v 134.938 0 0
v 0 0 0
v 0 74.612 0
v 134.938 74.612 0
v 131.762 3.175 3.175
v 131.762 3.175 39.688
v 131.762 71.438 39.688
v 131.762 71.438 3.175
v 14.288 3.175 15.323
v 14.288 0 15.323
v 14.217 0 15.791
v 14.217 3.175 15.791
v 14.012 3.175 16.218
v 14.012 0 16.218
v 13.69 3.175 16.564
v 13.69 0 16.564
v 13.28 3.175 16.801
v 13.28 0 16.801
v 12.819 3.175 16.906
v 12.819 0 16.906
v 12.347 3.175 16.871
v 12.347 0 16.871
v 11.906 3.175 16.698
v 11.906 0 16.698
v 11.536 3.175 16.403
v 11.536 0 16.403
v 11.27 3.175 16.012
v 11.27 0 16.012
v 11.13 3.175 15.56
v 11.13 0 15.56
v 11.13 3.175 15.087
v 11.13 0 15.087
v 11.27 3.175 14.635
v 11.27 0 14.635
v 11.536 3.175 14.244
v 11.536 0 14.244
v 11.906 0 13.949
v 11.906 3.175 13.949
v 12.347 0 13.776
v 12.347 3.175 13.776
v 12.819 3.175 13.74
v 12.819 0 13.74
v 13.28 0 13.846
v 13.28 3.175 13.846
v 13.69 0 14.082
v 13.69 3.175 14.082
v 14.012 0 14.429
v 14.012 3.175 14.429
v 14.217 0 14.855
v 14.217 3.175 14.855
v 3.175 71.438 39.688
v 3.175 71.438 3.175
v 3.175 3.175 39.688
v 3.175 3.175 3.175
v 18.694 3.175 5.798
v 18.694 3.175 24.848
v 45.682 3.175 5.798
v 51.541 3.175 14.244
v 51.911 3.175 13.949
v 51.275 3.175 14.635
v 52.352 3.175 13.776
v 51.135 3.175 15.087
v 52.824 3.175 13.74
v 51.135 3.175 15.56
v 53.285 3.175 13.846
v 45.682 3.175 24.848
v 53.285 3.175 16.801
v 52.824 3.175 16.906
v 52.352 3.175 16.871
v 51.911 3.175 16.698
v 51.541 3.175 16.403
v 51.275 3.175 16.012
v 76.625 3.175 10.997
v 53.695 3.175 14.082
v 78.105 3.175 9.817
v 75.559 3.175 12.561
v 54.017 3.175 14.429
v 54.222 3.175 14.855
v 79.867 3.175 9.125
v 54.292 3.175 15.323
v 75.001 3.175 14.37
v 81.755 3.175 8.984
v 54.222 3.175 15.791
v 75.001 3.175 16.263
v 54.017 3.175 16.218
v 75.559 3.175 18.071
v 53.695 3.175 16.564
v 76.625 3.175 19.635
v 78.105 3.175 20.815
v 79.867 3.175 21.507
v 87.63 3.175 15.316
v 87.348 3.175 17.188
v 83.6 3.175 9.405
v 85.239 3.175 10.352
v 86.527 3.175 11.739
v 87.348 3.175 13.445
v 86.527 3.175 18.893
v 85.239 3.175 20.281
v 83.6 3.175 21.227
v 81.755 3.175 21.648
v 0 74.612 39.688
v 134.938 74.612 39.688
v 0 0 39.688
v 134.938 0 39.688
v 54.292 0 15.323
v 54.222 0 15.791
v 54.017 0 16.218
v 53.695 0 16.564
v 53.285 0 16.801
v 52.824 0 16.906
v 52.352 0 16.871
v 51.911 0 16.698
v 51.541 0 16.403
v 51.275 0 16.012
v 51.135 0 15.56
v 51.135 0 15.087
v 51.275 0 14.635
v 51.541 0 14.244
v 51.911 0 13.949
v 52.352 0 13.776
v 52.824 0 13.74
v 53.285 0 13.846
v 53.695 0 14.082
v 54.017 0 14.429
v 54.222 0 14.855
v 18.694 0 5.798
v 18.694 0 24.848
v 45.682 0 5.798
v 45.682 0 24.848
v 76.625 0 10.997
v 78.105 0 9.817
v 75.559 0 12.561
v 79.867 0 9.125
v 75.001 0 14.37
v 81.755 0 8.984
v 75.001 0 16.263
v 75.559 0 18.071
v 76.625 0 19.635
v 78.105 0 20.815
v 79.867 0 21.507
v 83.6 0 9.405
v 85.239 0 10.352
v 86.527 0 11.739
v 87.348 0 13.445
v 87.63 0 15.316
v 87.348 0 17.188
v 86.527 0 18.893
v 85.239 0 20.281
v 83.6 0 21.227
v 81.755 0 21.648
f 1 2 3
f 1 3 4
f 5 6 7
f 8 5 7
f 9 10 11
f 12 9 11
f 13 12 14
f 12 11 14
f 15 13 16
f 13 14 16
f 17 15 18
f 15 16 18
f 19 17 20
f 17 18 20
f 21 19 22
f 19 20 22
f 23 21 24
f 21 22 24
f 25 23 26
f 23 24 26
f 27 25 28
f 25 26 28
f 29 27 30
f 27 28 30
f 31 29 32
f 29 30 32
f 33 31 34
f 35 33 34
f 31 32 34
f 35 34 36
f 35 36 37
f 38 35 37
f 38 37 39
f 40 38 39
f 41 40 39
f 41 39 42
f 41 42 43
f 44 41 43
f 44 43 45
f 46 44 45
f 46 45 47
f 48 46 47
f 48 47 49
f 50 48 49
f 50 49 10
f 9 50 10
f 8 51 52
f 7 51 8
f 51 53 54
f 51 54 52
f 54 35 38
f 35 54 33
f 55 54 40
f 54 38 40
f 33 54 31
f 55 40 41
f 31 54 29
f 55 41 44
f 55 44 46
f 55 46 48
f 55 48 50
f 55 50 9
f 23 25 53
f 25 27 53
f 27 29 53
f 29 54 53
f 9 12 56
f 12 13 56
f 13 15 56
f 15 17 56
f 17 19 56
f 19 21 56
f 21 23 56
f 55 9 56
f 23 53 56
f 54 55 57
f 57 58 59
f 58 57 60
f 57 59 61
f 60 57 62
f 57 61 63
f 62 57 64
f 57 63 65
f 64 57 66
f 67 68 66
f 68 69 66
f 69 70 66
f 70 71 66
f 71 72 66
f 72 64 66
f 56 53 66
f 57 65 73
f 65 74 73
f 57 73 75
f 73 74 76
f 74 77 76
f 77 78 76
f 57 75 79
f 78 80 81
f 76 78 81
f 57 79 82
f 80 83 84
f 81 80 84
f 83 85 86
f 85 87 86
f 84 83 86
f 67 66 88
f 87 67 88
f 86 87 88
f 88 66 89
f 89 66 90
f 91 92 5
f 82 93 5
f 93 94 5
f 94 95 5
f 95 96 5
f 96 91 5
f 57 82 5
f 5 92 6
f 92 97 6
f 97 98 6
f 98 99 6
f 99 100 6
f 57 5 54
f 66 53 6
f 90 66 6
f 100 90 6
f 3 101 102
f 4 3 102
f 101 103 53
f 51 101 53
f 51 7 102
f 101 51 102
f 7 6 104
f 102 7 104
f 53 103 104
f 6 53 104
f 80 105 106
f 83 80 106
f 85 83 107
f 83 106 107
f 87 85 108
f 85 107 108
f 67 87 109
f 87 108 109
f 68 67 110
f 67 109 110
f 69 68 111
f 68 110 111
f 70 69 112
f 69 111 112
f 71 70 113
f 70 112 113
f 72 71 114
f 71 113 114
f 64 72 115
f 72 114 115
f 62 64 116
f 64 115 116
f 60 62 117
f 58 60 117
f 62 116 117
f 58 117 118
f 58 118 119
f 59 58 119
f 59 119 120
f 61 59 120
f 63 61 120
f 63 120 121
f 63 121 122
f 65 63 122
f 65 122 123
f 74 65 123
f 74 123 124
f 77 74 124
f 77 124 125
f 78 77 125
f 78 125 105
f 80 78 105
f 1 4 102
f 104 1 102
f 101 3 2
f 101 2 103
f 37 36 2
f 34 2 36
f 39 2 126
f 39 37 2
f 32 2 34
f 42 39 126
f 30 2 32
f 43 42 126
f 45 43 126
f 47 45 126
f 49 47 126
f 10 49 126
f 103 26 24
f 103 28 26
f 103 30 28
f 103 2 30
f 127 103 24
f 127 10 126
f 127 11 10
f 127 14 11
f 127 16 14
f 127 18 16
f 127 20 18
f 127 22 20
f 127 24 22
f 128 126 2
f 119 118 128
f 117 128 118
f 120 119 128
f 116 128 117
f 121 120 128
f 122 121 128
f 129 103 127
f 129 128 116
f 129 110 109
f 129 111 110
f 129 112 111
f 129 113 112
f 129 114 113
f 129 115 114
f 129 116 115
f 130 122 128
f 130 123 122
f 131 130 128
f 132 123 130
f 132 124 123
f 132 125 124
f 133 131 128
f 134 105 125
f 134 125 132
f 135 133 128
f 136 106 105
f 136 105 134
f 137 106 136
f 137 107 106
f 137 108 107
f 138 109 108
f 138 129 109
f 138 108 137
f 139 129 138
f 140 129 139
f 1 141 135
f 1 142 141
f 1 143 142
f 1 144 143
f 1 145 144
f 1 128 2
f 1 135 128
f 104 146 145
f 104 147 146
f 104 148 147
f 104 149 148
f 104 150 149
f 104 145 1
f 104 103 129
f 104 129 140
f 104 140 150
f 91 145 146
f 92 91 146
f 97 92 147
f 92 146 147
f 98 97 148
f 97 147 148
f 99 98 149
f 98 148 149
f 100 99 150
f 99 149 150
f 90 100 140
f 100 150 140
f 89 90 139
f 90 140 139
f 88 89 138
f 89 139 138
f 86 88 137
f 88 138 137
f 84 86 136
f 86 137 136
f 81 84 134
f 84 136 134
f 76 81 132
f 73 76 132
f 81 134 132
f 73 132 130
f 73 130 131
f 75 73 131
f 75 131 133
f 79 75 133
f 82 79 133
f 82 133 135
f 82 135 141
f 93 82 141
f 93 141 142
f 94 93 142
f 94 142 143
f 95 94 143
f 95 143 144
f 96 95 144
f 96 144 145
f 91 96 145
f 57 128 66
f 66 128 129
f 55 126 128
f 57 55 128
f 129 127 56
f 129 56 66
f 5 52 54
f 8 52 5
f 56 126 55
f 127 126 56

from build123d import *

# Parameters (mm, degrees)
F0_W     = 134.9375
F0_H     = 39.6875
F1_DEPTH = 74.6125
F2_W     = 128.5875
F2_H     = 68.2625
F3_DEPTH = 36.5125
F4_R     = 1.5875
F4_W     = 26.9875
F4_H     = 19.05
F5_DEPTH = 6.35
F6_R     = 6.35
F7_DEPTH = 6.35


with BuildPart() as f1:
    # F0 (on Front) → F1 (new body)
    with BuildSketch(Plane.XZ):
        with Locations((67.46875, 19.84375)):
            Rectangle(F0_W, F0_H)
    extrude(amount=-F1_DEPTH)

    # F2 (on face) → F3 (cut)
    with BuildSketch(Plane.XY.offset(39.6875)):
        with Locations((67.46875, 37.30625)):
            Rectangle(F2_W, F2_H)
    extrude(amount=-F3_DEPTH, mode=Mode.SUBTRACT)

    # F4 (on face) → F5 (cut)
    with BuildSketch(Plane.XZ):
        with Locations((12.7, 15.323338)):
            Circle(F4_R)
        with Locations((52.705, 15.323338)):
            Circle(F4_R)
        with Locations((32.18815, 15.323338)):
            Rectangle(F4_W, F4_H)
    extrude(amount=-F5_DEPTH, mode=Mode.SUBTRACT)

    # F6 (on face) → F7 (cut)
    with BuildSketch(Plane.XZ):
        with Locations((81.28, 15.3162)):
            Circle(F6_R)
    extrude(amount=-F7_DEPTH, mode=Mode.SUBTRACT)


solid = f1.part
